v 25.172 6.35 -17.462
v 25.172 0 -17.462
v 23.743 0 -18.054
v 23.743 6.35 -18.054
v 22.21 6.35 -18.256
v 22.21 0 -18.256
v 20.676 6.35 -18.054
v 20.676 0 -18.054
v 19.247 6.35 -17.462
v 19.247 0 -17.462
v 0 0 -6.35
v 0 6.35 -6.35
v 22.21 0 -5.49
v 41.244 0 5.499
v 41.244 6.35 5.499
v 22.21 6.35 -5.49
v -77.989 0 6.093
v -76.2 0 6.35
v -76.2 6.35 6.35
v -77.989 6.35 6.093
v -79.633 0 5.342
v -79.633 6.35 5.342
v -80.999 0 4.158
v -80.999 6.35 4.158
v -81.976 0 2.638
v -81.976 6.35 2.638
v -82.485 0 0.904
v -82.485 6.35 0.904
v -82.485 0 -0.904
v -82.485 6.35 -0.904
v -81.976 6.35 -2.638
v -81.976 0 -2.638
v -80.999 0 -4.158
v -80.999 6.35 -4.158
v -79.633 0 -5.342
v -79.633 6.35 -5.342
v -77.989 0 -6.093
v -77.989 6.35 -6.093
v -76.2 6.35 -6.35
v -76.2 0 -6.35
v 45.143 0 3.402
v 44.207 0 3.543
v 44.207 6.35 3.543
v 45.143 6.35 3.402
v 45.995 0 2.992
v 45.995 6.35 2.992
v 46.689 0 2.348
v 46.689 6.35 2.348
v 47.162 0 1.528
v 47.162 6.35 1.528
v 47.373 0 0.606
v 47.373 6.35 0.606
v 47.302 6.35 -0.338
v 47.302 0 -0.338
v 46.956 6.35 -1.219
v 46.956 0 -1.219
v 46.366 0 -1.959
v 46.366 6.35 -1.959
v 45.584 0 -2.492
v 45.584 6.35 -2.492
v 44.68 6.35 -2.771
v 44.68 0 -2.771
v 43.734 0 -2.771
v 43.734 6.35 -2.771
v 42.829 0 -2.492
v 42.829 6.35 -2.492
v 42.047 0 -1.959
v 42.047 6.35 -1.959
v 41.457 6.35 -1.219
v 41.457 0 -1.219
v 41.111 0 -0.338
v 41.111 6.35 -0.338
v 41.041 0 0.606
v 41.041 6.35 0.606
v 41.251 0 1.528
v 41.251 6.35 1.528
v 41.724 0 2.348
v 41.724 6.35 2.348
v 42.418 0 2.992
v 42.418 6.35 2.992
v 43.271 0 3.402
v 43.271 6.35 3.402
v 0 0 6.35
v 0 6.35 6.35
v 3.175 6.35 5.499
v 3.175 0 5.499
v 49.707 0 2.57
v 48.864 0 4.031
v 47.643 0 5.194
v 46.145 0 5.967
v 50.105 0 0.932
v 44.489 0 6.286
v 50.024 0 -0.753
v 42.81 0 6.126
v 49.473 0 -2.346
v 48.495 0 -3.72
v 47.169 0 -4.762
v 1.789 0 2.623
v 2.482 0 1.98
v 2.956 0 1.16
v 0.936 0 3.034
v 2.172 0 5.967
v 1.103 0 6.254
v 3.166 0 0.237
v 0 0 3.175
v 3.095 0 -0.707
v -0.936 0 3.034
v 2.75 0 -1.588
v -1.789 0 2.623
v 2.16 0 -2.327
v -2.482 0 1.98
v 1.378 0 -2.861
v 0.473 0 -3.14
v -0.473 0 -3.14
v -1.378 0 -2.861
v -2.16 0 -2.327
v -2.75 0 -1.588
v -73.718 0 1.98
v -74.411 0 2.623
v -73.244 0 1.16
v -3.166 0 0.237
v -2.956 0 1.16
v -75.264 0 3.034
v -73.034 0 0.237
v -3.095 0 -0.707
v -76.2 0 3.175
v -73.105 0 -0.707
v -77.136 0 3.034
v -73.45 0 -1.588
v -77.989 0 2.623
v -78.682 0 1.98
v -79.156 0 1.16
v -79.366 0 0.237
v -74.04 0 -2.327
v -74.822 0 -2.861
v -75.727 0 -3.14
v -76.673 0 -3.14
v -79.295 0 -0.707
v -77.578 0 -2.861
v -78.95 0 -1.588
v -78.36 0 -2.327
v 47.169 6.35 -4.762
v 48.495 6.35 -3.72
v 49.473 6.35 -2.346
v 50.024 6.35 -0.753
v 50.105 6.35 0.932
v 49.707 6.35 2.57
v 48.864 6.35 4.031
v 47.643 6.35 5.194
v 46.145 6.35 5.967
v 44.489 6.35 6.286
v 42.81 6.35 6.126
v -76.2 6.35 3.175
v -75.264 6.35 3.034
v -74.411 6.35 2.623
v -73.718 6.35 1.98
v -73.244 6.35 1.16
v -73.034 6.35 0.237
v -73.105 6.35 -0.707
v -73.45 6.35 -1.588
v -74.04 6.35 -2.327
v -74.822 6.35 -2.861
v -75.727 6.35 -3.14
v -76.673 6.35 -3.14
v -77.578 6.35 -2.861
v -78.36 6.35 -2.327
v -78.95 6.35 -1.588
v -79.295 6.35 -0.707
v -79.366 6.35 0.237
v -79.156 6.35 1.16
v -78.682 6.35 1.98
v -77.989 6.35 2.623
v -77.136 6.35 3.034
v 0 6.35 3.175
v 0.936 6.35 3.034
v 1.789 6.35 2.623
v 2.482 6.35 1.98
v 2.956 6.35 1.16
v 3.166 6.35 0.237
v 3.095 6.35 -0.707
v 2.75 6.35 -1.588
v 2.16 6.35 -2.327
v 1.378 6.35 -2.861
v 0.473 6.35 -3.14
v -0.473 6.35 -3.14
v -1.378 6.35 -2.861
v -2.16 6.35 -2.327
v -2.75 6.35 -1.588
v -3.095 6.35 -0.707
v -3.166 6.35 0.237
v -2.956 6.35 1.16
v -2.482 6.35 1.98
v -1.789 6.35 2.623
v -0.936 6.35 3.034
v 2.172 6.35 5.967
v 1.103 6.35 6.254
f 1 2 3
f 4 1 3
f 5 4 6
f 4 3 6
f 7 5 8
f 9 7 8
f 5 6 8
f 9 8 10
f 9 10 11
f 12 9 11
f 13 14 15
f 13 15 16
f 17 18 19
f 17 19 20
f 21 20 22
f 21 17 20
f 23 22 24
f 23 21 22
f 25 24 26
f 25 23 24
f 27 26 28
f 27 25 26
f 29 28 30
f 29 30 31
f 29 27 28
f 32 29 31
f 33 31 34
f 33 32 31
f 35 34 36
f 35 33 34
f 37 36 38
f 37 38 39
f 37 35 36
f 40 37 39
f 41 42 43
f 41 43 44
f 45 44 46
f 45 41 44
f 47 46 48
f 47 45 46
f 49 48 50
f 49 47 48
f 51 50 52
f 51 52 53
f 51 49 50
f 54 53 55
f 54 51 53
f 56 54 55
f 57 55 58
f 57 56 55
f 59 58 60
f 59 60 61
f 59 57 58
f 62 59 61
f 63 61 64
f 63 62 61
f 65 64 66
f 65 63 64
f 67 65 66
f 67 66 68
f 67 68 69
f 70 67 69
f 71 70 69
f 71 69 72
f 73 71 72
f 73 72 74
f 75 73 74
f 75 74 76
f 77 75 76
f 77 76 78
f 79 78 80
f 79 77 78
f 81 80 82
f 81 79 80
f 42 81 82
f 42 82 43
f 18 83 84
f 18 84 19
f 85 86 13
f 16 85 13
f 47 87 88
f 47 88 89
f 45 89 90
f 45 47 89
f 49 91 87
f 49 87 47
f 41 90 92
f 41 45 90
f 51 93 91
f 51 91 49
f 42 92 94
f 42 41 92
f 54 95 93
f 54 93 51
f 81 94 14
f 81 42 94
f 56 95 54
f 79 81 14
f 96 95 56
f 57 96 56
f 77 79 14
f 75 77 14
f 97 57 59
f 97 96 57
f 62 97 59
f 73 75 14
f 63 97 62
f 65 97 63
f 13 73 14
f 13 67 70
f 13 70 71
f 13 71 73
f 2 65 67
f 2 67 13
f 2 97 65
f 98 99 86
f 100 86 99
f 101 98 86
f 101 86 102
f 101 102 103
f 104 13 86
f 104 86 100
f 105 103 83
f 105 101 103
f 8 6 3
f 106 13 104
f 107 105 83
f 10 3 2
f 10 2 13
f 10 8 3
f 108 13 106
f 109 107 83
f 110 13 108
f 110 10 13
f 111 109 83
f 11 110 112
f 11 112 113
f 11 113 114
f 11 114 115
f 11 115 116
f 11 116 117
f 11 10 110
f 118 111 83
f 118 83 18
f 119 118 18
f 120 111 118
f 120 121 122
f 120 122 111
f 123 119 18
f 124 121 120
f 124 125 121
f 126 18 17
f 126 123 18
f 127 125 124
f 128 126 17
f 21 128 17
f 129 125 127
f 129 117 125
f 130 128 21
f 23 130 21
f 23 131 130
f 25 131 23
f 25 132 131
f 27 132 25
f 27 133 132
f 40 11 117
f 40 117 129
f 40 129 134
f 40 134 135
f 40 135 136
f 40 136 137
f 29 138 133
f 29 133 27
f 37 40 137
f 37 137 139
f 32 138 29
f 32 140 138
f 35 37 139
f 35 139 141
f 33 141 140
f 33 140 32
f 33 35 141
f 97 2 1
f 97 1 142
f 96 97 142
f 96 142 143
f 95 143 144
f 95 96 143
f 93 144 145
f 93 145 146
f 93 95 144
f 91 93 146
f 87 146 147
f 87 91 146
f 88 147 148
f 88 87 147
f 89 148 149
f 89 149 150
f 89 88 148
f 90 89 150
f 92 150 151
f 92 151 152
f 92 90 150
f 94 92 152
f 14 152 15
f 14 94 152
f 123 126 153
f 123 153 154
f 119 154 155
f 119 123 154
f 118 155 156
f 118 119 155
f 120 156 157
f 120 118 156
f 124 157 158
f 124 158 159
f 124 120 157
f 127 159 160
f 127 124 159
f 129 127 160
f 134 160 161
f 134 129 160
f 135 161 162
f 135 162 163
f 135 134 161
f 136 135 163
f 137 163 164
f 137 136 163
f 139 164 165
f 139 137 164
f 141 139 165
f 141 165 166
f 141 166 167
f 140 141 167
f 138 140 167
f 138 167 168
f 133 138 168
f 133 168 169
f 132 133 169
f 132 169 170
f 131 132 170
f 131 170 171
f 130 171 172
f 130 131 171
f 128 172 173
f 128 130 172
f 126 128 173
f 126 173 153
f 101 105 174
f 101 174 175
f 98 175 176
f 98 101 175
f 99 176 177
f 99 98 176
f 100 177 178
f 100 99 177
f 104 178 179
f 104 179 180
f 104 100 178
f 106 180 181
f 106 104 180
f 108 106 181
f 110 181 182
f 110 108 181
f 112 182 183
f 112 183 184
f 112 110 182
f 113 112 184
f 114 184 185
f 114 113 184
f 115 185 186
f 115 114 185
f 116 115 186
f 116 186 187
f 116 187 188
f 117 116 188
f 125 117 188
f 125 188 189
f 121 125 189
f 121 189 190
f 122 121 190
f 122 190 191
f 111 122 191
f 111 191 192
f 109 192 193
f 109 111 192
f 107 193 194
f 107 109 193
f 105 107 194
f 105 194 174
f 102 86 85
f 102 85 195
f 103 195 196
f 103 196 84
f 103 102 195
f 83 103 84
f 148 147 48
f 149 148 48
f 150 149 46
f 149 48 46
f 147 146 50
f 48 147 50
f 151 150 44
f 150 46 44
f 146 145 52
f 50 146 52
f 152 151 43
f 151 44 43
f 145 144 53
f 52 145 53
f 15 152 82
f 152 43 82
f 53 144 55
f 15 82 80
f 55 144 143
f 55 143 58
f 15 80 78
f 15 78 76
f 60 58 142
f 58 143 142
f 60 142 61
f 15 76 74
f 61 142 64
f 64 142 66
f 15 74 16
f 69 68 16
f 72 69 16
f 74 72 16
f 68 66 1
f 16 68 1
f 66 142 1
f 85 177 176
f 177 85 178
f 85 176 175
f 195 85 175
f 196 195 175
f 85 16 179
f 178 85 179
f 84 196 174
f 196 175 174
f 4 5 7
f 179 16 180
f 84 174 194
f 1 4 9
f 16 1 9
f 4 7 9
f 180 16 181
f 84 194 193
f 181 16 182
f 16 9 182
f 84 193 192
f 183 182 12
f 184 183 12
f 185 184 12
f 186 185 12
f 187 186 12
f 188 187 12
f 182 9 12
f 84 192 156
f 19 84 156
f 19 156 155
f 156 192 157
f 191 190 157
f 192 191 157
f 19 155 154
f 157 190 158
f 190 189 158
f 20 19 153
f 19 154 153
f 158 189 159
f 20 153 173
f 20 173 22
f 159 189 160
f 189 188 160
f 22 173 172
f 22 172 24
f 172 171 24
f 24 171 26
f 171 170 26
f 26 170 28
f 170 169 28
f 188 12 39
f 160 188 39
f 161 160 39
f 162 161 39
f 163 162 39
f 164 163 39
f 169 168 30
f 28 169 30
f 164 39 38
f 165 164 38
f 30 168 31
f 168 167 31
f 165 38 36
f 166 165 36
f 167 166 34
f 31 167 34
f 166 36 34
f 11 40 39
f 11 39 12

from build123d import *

# Parameters (mm, degrees)
SKETCH1_R           = 3.175
BOSS_EXTRUDE1_DEPTH = 6.35
BOSS_EXTRUDE2_START = -6.35
BOSS_EXTRUDE2_DEPTH = 6.35
BOSS_EXTRUDE3_START = -6.35
SKETCH3_R           = 3.175
BOSS_EXTRUDE3_DEPTH = 6.35


with BuildPart() as part:
    # Sketch1 → Boss-Extrude1 (new body)
    with BuildSketch(Plane(origin=(0, 0, 0), x_dir=(1, 0, 0), z_dir=(0, 1, 0))):
        with BuildLine():
            Line((0, -6.35), (-76.2, -6.35))
            ThreePointArc((-76.2, -6.35), (-82.55, 0), (-76.2, 6.35))
            Line((-76.2, 6.35), (0, 6.35))
            ThreePointArc((0, 6.35), (6.35, 0), (0, -6.35))
        make_face()
        with Locations(Location((-76.2, 0, 0), (0, 0, 270))):
            Circle(SKETCH1_R, mode=Mode.SUBTRACT)
        with Locations(Location((0, 0, 0), (0, 0, 270))):
            Circle(SKETCH1_R, mode=Mode.SUBTRACT)
    extrude(amount=BOSS_EXTRUDE1_DEPTH)

    # Sketch2 → Boss-Extrude2 (add)
    with BuildSketch(Plane(origin=(0, 6.35, 0), x_dir=(1, 0, 0), z_dir=(0, 1, 0)).offset(BOSS_EXTRUDE2_START)):
        with BuildLine():
            Line((3.175, -5.499261314), (25.172045256, 7.200738686))
            ThreePointArc((25.172045256, 7.200738686), (27.340610585, 15.293934671), (19.247414599, 17.4625))
            Line((19.247414599, 17.4625), (0, 6.35))
            ThreePointArc((0, 6.35), (6.133628997, 1.643500936), (3.175, -5.499261314))
        make_face()
    extrude(amount=BOSS_EXTRUDE2_DEPTH)

    # Sketch3 → Boss-Extrude3 (add)
    with BuildSketch(Plane(origin=(0, 6.35, 0), x_dir=(1, 0, 0), z_dir=(0, 1, 0)).offset(BOSS_EXTRUDE3_START)):
        with BuildLine():
            Line((25.172045256, 17.4625), (47.169090512, 4.7625))
            ThreePointArc((47.169090512, 4.7625), (49.337655841, -3.330695986), (41.244459855, -5.499261314))
            Line((41.244459855, -5.499261314), (22.209729928, 5.490445134))
            Line((22.209729928, 5.490445134), (25.172045256, 7.200738686))
            ThreePointArc((25.172045256, 7.200738686), (28.134360585, 12.331619343), (25.172045256, 17.4625))
        make_face()
        with Locations(Location((44.206775184, -0.368380657, 0), (0, 0, 270))):
            Circle(SKETCH3_R, mode=Mode.SUBTRACT)
    extrude(amount=BOSS_EXTRUDE3_DEPTH)


solid = part.part
